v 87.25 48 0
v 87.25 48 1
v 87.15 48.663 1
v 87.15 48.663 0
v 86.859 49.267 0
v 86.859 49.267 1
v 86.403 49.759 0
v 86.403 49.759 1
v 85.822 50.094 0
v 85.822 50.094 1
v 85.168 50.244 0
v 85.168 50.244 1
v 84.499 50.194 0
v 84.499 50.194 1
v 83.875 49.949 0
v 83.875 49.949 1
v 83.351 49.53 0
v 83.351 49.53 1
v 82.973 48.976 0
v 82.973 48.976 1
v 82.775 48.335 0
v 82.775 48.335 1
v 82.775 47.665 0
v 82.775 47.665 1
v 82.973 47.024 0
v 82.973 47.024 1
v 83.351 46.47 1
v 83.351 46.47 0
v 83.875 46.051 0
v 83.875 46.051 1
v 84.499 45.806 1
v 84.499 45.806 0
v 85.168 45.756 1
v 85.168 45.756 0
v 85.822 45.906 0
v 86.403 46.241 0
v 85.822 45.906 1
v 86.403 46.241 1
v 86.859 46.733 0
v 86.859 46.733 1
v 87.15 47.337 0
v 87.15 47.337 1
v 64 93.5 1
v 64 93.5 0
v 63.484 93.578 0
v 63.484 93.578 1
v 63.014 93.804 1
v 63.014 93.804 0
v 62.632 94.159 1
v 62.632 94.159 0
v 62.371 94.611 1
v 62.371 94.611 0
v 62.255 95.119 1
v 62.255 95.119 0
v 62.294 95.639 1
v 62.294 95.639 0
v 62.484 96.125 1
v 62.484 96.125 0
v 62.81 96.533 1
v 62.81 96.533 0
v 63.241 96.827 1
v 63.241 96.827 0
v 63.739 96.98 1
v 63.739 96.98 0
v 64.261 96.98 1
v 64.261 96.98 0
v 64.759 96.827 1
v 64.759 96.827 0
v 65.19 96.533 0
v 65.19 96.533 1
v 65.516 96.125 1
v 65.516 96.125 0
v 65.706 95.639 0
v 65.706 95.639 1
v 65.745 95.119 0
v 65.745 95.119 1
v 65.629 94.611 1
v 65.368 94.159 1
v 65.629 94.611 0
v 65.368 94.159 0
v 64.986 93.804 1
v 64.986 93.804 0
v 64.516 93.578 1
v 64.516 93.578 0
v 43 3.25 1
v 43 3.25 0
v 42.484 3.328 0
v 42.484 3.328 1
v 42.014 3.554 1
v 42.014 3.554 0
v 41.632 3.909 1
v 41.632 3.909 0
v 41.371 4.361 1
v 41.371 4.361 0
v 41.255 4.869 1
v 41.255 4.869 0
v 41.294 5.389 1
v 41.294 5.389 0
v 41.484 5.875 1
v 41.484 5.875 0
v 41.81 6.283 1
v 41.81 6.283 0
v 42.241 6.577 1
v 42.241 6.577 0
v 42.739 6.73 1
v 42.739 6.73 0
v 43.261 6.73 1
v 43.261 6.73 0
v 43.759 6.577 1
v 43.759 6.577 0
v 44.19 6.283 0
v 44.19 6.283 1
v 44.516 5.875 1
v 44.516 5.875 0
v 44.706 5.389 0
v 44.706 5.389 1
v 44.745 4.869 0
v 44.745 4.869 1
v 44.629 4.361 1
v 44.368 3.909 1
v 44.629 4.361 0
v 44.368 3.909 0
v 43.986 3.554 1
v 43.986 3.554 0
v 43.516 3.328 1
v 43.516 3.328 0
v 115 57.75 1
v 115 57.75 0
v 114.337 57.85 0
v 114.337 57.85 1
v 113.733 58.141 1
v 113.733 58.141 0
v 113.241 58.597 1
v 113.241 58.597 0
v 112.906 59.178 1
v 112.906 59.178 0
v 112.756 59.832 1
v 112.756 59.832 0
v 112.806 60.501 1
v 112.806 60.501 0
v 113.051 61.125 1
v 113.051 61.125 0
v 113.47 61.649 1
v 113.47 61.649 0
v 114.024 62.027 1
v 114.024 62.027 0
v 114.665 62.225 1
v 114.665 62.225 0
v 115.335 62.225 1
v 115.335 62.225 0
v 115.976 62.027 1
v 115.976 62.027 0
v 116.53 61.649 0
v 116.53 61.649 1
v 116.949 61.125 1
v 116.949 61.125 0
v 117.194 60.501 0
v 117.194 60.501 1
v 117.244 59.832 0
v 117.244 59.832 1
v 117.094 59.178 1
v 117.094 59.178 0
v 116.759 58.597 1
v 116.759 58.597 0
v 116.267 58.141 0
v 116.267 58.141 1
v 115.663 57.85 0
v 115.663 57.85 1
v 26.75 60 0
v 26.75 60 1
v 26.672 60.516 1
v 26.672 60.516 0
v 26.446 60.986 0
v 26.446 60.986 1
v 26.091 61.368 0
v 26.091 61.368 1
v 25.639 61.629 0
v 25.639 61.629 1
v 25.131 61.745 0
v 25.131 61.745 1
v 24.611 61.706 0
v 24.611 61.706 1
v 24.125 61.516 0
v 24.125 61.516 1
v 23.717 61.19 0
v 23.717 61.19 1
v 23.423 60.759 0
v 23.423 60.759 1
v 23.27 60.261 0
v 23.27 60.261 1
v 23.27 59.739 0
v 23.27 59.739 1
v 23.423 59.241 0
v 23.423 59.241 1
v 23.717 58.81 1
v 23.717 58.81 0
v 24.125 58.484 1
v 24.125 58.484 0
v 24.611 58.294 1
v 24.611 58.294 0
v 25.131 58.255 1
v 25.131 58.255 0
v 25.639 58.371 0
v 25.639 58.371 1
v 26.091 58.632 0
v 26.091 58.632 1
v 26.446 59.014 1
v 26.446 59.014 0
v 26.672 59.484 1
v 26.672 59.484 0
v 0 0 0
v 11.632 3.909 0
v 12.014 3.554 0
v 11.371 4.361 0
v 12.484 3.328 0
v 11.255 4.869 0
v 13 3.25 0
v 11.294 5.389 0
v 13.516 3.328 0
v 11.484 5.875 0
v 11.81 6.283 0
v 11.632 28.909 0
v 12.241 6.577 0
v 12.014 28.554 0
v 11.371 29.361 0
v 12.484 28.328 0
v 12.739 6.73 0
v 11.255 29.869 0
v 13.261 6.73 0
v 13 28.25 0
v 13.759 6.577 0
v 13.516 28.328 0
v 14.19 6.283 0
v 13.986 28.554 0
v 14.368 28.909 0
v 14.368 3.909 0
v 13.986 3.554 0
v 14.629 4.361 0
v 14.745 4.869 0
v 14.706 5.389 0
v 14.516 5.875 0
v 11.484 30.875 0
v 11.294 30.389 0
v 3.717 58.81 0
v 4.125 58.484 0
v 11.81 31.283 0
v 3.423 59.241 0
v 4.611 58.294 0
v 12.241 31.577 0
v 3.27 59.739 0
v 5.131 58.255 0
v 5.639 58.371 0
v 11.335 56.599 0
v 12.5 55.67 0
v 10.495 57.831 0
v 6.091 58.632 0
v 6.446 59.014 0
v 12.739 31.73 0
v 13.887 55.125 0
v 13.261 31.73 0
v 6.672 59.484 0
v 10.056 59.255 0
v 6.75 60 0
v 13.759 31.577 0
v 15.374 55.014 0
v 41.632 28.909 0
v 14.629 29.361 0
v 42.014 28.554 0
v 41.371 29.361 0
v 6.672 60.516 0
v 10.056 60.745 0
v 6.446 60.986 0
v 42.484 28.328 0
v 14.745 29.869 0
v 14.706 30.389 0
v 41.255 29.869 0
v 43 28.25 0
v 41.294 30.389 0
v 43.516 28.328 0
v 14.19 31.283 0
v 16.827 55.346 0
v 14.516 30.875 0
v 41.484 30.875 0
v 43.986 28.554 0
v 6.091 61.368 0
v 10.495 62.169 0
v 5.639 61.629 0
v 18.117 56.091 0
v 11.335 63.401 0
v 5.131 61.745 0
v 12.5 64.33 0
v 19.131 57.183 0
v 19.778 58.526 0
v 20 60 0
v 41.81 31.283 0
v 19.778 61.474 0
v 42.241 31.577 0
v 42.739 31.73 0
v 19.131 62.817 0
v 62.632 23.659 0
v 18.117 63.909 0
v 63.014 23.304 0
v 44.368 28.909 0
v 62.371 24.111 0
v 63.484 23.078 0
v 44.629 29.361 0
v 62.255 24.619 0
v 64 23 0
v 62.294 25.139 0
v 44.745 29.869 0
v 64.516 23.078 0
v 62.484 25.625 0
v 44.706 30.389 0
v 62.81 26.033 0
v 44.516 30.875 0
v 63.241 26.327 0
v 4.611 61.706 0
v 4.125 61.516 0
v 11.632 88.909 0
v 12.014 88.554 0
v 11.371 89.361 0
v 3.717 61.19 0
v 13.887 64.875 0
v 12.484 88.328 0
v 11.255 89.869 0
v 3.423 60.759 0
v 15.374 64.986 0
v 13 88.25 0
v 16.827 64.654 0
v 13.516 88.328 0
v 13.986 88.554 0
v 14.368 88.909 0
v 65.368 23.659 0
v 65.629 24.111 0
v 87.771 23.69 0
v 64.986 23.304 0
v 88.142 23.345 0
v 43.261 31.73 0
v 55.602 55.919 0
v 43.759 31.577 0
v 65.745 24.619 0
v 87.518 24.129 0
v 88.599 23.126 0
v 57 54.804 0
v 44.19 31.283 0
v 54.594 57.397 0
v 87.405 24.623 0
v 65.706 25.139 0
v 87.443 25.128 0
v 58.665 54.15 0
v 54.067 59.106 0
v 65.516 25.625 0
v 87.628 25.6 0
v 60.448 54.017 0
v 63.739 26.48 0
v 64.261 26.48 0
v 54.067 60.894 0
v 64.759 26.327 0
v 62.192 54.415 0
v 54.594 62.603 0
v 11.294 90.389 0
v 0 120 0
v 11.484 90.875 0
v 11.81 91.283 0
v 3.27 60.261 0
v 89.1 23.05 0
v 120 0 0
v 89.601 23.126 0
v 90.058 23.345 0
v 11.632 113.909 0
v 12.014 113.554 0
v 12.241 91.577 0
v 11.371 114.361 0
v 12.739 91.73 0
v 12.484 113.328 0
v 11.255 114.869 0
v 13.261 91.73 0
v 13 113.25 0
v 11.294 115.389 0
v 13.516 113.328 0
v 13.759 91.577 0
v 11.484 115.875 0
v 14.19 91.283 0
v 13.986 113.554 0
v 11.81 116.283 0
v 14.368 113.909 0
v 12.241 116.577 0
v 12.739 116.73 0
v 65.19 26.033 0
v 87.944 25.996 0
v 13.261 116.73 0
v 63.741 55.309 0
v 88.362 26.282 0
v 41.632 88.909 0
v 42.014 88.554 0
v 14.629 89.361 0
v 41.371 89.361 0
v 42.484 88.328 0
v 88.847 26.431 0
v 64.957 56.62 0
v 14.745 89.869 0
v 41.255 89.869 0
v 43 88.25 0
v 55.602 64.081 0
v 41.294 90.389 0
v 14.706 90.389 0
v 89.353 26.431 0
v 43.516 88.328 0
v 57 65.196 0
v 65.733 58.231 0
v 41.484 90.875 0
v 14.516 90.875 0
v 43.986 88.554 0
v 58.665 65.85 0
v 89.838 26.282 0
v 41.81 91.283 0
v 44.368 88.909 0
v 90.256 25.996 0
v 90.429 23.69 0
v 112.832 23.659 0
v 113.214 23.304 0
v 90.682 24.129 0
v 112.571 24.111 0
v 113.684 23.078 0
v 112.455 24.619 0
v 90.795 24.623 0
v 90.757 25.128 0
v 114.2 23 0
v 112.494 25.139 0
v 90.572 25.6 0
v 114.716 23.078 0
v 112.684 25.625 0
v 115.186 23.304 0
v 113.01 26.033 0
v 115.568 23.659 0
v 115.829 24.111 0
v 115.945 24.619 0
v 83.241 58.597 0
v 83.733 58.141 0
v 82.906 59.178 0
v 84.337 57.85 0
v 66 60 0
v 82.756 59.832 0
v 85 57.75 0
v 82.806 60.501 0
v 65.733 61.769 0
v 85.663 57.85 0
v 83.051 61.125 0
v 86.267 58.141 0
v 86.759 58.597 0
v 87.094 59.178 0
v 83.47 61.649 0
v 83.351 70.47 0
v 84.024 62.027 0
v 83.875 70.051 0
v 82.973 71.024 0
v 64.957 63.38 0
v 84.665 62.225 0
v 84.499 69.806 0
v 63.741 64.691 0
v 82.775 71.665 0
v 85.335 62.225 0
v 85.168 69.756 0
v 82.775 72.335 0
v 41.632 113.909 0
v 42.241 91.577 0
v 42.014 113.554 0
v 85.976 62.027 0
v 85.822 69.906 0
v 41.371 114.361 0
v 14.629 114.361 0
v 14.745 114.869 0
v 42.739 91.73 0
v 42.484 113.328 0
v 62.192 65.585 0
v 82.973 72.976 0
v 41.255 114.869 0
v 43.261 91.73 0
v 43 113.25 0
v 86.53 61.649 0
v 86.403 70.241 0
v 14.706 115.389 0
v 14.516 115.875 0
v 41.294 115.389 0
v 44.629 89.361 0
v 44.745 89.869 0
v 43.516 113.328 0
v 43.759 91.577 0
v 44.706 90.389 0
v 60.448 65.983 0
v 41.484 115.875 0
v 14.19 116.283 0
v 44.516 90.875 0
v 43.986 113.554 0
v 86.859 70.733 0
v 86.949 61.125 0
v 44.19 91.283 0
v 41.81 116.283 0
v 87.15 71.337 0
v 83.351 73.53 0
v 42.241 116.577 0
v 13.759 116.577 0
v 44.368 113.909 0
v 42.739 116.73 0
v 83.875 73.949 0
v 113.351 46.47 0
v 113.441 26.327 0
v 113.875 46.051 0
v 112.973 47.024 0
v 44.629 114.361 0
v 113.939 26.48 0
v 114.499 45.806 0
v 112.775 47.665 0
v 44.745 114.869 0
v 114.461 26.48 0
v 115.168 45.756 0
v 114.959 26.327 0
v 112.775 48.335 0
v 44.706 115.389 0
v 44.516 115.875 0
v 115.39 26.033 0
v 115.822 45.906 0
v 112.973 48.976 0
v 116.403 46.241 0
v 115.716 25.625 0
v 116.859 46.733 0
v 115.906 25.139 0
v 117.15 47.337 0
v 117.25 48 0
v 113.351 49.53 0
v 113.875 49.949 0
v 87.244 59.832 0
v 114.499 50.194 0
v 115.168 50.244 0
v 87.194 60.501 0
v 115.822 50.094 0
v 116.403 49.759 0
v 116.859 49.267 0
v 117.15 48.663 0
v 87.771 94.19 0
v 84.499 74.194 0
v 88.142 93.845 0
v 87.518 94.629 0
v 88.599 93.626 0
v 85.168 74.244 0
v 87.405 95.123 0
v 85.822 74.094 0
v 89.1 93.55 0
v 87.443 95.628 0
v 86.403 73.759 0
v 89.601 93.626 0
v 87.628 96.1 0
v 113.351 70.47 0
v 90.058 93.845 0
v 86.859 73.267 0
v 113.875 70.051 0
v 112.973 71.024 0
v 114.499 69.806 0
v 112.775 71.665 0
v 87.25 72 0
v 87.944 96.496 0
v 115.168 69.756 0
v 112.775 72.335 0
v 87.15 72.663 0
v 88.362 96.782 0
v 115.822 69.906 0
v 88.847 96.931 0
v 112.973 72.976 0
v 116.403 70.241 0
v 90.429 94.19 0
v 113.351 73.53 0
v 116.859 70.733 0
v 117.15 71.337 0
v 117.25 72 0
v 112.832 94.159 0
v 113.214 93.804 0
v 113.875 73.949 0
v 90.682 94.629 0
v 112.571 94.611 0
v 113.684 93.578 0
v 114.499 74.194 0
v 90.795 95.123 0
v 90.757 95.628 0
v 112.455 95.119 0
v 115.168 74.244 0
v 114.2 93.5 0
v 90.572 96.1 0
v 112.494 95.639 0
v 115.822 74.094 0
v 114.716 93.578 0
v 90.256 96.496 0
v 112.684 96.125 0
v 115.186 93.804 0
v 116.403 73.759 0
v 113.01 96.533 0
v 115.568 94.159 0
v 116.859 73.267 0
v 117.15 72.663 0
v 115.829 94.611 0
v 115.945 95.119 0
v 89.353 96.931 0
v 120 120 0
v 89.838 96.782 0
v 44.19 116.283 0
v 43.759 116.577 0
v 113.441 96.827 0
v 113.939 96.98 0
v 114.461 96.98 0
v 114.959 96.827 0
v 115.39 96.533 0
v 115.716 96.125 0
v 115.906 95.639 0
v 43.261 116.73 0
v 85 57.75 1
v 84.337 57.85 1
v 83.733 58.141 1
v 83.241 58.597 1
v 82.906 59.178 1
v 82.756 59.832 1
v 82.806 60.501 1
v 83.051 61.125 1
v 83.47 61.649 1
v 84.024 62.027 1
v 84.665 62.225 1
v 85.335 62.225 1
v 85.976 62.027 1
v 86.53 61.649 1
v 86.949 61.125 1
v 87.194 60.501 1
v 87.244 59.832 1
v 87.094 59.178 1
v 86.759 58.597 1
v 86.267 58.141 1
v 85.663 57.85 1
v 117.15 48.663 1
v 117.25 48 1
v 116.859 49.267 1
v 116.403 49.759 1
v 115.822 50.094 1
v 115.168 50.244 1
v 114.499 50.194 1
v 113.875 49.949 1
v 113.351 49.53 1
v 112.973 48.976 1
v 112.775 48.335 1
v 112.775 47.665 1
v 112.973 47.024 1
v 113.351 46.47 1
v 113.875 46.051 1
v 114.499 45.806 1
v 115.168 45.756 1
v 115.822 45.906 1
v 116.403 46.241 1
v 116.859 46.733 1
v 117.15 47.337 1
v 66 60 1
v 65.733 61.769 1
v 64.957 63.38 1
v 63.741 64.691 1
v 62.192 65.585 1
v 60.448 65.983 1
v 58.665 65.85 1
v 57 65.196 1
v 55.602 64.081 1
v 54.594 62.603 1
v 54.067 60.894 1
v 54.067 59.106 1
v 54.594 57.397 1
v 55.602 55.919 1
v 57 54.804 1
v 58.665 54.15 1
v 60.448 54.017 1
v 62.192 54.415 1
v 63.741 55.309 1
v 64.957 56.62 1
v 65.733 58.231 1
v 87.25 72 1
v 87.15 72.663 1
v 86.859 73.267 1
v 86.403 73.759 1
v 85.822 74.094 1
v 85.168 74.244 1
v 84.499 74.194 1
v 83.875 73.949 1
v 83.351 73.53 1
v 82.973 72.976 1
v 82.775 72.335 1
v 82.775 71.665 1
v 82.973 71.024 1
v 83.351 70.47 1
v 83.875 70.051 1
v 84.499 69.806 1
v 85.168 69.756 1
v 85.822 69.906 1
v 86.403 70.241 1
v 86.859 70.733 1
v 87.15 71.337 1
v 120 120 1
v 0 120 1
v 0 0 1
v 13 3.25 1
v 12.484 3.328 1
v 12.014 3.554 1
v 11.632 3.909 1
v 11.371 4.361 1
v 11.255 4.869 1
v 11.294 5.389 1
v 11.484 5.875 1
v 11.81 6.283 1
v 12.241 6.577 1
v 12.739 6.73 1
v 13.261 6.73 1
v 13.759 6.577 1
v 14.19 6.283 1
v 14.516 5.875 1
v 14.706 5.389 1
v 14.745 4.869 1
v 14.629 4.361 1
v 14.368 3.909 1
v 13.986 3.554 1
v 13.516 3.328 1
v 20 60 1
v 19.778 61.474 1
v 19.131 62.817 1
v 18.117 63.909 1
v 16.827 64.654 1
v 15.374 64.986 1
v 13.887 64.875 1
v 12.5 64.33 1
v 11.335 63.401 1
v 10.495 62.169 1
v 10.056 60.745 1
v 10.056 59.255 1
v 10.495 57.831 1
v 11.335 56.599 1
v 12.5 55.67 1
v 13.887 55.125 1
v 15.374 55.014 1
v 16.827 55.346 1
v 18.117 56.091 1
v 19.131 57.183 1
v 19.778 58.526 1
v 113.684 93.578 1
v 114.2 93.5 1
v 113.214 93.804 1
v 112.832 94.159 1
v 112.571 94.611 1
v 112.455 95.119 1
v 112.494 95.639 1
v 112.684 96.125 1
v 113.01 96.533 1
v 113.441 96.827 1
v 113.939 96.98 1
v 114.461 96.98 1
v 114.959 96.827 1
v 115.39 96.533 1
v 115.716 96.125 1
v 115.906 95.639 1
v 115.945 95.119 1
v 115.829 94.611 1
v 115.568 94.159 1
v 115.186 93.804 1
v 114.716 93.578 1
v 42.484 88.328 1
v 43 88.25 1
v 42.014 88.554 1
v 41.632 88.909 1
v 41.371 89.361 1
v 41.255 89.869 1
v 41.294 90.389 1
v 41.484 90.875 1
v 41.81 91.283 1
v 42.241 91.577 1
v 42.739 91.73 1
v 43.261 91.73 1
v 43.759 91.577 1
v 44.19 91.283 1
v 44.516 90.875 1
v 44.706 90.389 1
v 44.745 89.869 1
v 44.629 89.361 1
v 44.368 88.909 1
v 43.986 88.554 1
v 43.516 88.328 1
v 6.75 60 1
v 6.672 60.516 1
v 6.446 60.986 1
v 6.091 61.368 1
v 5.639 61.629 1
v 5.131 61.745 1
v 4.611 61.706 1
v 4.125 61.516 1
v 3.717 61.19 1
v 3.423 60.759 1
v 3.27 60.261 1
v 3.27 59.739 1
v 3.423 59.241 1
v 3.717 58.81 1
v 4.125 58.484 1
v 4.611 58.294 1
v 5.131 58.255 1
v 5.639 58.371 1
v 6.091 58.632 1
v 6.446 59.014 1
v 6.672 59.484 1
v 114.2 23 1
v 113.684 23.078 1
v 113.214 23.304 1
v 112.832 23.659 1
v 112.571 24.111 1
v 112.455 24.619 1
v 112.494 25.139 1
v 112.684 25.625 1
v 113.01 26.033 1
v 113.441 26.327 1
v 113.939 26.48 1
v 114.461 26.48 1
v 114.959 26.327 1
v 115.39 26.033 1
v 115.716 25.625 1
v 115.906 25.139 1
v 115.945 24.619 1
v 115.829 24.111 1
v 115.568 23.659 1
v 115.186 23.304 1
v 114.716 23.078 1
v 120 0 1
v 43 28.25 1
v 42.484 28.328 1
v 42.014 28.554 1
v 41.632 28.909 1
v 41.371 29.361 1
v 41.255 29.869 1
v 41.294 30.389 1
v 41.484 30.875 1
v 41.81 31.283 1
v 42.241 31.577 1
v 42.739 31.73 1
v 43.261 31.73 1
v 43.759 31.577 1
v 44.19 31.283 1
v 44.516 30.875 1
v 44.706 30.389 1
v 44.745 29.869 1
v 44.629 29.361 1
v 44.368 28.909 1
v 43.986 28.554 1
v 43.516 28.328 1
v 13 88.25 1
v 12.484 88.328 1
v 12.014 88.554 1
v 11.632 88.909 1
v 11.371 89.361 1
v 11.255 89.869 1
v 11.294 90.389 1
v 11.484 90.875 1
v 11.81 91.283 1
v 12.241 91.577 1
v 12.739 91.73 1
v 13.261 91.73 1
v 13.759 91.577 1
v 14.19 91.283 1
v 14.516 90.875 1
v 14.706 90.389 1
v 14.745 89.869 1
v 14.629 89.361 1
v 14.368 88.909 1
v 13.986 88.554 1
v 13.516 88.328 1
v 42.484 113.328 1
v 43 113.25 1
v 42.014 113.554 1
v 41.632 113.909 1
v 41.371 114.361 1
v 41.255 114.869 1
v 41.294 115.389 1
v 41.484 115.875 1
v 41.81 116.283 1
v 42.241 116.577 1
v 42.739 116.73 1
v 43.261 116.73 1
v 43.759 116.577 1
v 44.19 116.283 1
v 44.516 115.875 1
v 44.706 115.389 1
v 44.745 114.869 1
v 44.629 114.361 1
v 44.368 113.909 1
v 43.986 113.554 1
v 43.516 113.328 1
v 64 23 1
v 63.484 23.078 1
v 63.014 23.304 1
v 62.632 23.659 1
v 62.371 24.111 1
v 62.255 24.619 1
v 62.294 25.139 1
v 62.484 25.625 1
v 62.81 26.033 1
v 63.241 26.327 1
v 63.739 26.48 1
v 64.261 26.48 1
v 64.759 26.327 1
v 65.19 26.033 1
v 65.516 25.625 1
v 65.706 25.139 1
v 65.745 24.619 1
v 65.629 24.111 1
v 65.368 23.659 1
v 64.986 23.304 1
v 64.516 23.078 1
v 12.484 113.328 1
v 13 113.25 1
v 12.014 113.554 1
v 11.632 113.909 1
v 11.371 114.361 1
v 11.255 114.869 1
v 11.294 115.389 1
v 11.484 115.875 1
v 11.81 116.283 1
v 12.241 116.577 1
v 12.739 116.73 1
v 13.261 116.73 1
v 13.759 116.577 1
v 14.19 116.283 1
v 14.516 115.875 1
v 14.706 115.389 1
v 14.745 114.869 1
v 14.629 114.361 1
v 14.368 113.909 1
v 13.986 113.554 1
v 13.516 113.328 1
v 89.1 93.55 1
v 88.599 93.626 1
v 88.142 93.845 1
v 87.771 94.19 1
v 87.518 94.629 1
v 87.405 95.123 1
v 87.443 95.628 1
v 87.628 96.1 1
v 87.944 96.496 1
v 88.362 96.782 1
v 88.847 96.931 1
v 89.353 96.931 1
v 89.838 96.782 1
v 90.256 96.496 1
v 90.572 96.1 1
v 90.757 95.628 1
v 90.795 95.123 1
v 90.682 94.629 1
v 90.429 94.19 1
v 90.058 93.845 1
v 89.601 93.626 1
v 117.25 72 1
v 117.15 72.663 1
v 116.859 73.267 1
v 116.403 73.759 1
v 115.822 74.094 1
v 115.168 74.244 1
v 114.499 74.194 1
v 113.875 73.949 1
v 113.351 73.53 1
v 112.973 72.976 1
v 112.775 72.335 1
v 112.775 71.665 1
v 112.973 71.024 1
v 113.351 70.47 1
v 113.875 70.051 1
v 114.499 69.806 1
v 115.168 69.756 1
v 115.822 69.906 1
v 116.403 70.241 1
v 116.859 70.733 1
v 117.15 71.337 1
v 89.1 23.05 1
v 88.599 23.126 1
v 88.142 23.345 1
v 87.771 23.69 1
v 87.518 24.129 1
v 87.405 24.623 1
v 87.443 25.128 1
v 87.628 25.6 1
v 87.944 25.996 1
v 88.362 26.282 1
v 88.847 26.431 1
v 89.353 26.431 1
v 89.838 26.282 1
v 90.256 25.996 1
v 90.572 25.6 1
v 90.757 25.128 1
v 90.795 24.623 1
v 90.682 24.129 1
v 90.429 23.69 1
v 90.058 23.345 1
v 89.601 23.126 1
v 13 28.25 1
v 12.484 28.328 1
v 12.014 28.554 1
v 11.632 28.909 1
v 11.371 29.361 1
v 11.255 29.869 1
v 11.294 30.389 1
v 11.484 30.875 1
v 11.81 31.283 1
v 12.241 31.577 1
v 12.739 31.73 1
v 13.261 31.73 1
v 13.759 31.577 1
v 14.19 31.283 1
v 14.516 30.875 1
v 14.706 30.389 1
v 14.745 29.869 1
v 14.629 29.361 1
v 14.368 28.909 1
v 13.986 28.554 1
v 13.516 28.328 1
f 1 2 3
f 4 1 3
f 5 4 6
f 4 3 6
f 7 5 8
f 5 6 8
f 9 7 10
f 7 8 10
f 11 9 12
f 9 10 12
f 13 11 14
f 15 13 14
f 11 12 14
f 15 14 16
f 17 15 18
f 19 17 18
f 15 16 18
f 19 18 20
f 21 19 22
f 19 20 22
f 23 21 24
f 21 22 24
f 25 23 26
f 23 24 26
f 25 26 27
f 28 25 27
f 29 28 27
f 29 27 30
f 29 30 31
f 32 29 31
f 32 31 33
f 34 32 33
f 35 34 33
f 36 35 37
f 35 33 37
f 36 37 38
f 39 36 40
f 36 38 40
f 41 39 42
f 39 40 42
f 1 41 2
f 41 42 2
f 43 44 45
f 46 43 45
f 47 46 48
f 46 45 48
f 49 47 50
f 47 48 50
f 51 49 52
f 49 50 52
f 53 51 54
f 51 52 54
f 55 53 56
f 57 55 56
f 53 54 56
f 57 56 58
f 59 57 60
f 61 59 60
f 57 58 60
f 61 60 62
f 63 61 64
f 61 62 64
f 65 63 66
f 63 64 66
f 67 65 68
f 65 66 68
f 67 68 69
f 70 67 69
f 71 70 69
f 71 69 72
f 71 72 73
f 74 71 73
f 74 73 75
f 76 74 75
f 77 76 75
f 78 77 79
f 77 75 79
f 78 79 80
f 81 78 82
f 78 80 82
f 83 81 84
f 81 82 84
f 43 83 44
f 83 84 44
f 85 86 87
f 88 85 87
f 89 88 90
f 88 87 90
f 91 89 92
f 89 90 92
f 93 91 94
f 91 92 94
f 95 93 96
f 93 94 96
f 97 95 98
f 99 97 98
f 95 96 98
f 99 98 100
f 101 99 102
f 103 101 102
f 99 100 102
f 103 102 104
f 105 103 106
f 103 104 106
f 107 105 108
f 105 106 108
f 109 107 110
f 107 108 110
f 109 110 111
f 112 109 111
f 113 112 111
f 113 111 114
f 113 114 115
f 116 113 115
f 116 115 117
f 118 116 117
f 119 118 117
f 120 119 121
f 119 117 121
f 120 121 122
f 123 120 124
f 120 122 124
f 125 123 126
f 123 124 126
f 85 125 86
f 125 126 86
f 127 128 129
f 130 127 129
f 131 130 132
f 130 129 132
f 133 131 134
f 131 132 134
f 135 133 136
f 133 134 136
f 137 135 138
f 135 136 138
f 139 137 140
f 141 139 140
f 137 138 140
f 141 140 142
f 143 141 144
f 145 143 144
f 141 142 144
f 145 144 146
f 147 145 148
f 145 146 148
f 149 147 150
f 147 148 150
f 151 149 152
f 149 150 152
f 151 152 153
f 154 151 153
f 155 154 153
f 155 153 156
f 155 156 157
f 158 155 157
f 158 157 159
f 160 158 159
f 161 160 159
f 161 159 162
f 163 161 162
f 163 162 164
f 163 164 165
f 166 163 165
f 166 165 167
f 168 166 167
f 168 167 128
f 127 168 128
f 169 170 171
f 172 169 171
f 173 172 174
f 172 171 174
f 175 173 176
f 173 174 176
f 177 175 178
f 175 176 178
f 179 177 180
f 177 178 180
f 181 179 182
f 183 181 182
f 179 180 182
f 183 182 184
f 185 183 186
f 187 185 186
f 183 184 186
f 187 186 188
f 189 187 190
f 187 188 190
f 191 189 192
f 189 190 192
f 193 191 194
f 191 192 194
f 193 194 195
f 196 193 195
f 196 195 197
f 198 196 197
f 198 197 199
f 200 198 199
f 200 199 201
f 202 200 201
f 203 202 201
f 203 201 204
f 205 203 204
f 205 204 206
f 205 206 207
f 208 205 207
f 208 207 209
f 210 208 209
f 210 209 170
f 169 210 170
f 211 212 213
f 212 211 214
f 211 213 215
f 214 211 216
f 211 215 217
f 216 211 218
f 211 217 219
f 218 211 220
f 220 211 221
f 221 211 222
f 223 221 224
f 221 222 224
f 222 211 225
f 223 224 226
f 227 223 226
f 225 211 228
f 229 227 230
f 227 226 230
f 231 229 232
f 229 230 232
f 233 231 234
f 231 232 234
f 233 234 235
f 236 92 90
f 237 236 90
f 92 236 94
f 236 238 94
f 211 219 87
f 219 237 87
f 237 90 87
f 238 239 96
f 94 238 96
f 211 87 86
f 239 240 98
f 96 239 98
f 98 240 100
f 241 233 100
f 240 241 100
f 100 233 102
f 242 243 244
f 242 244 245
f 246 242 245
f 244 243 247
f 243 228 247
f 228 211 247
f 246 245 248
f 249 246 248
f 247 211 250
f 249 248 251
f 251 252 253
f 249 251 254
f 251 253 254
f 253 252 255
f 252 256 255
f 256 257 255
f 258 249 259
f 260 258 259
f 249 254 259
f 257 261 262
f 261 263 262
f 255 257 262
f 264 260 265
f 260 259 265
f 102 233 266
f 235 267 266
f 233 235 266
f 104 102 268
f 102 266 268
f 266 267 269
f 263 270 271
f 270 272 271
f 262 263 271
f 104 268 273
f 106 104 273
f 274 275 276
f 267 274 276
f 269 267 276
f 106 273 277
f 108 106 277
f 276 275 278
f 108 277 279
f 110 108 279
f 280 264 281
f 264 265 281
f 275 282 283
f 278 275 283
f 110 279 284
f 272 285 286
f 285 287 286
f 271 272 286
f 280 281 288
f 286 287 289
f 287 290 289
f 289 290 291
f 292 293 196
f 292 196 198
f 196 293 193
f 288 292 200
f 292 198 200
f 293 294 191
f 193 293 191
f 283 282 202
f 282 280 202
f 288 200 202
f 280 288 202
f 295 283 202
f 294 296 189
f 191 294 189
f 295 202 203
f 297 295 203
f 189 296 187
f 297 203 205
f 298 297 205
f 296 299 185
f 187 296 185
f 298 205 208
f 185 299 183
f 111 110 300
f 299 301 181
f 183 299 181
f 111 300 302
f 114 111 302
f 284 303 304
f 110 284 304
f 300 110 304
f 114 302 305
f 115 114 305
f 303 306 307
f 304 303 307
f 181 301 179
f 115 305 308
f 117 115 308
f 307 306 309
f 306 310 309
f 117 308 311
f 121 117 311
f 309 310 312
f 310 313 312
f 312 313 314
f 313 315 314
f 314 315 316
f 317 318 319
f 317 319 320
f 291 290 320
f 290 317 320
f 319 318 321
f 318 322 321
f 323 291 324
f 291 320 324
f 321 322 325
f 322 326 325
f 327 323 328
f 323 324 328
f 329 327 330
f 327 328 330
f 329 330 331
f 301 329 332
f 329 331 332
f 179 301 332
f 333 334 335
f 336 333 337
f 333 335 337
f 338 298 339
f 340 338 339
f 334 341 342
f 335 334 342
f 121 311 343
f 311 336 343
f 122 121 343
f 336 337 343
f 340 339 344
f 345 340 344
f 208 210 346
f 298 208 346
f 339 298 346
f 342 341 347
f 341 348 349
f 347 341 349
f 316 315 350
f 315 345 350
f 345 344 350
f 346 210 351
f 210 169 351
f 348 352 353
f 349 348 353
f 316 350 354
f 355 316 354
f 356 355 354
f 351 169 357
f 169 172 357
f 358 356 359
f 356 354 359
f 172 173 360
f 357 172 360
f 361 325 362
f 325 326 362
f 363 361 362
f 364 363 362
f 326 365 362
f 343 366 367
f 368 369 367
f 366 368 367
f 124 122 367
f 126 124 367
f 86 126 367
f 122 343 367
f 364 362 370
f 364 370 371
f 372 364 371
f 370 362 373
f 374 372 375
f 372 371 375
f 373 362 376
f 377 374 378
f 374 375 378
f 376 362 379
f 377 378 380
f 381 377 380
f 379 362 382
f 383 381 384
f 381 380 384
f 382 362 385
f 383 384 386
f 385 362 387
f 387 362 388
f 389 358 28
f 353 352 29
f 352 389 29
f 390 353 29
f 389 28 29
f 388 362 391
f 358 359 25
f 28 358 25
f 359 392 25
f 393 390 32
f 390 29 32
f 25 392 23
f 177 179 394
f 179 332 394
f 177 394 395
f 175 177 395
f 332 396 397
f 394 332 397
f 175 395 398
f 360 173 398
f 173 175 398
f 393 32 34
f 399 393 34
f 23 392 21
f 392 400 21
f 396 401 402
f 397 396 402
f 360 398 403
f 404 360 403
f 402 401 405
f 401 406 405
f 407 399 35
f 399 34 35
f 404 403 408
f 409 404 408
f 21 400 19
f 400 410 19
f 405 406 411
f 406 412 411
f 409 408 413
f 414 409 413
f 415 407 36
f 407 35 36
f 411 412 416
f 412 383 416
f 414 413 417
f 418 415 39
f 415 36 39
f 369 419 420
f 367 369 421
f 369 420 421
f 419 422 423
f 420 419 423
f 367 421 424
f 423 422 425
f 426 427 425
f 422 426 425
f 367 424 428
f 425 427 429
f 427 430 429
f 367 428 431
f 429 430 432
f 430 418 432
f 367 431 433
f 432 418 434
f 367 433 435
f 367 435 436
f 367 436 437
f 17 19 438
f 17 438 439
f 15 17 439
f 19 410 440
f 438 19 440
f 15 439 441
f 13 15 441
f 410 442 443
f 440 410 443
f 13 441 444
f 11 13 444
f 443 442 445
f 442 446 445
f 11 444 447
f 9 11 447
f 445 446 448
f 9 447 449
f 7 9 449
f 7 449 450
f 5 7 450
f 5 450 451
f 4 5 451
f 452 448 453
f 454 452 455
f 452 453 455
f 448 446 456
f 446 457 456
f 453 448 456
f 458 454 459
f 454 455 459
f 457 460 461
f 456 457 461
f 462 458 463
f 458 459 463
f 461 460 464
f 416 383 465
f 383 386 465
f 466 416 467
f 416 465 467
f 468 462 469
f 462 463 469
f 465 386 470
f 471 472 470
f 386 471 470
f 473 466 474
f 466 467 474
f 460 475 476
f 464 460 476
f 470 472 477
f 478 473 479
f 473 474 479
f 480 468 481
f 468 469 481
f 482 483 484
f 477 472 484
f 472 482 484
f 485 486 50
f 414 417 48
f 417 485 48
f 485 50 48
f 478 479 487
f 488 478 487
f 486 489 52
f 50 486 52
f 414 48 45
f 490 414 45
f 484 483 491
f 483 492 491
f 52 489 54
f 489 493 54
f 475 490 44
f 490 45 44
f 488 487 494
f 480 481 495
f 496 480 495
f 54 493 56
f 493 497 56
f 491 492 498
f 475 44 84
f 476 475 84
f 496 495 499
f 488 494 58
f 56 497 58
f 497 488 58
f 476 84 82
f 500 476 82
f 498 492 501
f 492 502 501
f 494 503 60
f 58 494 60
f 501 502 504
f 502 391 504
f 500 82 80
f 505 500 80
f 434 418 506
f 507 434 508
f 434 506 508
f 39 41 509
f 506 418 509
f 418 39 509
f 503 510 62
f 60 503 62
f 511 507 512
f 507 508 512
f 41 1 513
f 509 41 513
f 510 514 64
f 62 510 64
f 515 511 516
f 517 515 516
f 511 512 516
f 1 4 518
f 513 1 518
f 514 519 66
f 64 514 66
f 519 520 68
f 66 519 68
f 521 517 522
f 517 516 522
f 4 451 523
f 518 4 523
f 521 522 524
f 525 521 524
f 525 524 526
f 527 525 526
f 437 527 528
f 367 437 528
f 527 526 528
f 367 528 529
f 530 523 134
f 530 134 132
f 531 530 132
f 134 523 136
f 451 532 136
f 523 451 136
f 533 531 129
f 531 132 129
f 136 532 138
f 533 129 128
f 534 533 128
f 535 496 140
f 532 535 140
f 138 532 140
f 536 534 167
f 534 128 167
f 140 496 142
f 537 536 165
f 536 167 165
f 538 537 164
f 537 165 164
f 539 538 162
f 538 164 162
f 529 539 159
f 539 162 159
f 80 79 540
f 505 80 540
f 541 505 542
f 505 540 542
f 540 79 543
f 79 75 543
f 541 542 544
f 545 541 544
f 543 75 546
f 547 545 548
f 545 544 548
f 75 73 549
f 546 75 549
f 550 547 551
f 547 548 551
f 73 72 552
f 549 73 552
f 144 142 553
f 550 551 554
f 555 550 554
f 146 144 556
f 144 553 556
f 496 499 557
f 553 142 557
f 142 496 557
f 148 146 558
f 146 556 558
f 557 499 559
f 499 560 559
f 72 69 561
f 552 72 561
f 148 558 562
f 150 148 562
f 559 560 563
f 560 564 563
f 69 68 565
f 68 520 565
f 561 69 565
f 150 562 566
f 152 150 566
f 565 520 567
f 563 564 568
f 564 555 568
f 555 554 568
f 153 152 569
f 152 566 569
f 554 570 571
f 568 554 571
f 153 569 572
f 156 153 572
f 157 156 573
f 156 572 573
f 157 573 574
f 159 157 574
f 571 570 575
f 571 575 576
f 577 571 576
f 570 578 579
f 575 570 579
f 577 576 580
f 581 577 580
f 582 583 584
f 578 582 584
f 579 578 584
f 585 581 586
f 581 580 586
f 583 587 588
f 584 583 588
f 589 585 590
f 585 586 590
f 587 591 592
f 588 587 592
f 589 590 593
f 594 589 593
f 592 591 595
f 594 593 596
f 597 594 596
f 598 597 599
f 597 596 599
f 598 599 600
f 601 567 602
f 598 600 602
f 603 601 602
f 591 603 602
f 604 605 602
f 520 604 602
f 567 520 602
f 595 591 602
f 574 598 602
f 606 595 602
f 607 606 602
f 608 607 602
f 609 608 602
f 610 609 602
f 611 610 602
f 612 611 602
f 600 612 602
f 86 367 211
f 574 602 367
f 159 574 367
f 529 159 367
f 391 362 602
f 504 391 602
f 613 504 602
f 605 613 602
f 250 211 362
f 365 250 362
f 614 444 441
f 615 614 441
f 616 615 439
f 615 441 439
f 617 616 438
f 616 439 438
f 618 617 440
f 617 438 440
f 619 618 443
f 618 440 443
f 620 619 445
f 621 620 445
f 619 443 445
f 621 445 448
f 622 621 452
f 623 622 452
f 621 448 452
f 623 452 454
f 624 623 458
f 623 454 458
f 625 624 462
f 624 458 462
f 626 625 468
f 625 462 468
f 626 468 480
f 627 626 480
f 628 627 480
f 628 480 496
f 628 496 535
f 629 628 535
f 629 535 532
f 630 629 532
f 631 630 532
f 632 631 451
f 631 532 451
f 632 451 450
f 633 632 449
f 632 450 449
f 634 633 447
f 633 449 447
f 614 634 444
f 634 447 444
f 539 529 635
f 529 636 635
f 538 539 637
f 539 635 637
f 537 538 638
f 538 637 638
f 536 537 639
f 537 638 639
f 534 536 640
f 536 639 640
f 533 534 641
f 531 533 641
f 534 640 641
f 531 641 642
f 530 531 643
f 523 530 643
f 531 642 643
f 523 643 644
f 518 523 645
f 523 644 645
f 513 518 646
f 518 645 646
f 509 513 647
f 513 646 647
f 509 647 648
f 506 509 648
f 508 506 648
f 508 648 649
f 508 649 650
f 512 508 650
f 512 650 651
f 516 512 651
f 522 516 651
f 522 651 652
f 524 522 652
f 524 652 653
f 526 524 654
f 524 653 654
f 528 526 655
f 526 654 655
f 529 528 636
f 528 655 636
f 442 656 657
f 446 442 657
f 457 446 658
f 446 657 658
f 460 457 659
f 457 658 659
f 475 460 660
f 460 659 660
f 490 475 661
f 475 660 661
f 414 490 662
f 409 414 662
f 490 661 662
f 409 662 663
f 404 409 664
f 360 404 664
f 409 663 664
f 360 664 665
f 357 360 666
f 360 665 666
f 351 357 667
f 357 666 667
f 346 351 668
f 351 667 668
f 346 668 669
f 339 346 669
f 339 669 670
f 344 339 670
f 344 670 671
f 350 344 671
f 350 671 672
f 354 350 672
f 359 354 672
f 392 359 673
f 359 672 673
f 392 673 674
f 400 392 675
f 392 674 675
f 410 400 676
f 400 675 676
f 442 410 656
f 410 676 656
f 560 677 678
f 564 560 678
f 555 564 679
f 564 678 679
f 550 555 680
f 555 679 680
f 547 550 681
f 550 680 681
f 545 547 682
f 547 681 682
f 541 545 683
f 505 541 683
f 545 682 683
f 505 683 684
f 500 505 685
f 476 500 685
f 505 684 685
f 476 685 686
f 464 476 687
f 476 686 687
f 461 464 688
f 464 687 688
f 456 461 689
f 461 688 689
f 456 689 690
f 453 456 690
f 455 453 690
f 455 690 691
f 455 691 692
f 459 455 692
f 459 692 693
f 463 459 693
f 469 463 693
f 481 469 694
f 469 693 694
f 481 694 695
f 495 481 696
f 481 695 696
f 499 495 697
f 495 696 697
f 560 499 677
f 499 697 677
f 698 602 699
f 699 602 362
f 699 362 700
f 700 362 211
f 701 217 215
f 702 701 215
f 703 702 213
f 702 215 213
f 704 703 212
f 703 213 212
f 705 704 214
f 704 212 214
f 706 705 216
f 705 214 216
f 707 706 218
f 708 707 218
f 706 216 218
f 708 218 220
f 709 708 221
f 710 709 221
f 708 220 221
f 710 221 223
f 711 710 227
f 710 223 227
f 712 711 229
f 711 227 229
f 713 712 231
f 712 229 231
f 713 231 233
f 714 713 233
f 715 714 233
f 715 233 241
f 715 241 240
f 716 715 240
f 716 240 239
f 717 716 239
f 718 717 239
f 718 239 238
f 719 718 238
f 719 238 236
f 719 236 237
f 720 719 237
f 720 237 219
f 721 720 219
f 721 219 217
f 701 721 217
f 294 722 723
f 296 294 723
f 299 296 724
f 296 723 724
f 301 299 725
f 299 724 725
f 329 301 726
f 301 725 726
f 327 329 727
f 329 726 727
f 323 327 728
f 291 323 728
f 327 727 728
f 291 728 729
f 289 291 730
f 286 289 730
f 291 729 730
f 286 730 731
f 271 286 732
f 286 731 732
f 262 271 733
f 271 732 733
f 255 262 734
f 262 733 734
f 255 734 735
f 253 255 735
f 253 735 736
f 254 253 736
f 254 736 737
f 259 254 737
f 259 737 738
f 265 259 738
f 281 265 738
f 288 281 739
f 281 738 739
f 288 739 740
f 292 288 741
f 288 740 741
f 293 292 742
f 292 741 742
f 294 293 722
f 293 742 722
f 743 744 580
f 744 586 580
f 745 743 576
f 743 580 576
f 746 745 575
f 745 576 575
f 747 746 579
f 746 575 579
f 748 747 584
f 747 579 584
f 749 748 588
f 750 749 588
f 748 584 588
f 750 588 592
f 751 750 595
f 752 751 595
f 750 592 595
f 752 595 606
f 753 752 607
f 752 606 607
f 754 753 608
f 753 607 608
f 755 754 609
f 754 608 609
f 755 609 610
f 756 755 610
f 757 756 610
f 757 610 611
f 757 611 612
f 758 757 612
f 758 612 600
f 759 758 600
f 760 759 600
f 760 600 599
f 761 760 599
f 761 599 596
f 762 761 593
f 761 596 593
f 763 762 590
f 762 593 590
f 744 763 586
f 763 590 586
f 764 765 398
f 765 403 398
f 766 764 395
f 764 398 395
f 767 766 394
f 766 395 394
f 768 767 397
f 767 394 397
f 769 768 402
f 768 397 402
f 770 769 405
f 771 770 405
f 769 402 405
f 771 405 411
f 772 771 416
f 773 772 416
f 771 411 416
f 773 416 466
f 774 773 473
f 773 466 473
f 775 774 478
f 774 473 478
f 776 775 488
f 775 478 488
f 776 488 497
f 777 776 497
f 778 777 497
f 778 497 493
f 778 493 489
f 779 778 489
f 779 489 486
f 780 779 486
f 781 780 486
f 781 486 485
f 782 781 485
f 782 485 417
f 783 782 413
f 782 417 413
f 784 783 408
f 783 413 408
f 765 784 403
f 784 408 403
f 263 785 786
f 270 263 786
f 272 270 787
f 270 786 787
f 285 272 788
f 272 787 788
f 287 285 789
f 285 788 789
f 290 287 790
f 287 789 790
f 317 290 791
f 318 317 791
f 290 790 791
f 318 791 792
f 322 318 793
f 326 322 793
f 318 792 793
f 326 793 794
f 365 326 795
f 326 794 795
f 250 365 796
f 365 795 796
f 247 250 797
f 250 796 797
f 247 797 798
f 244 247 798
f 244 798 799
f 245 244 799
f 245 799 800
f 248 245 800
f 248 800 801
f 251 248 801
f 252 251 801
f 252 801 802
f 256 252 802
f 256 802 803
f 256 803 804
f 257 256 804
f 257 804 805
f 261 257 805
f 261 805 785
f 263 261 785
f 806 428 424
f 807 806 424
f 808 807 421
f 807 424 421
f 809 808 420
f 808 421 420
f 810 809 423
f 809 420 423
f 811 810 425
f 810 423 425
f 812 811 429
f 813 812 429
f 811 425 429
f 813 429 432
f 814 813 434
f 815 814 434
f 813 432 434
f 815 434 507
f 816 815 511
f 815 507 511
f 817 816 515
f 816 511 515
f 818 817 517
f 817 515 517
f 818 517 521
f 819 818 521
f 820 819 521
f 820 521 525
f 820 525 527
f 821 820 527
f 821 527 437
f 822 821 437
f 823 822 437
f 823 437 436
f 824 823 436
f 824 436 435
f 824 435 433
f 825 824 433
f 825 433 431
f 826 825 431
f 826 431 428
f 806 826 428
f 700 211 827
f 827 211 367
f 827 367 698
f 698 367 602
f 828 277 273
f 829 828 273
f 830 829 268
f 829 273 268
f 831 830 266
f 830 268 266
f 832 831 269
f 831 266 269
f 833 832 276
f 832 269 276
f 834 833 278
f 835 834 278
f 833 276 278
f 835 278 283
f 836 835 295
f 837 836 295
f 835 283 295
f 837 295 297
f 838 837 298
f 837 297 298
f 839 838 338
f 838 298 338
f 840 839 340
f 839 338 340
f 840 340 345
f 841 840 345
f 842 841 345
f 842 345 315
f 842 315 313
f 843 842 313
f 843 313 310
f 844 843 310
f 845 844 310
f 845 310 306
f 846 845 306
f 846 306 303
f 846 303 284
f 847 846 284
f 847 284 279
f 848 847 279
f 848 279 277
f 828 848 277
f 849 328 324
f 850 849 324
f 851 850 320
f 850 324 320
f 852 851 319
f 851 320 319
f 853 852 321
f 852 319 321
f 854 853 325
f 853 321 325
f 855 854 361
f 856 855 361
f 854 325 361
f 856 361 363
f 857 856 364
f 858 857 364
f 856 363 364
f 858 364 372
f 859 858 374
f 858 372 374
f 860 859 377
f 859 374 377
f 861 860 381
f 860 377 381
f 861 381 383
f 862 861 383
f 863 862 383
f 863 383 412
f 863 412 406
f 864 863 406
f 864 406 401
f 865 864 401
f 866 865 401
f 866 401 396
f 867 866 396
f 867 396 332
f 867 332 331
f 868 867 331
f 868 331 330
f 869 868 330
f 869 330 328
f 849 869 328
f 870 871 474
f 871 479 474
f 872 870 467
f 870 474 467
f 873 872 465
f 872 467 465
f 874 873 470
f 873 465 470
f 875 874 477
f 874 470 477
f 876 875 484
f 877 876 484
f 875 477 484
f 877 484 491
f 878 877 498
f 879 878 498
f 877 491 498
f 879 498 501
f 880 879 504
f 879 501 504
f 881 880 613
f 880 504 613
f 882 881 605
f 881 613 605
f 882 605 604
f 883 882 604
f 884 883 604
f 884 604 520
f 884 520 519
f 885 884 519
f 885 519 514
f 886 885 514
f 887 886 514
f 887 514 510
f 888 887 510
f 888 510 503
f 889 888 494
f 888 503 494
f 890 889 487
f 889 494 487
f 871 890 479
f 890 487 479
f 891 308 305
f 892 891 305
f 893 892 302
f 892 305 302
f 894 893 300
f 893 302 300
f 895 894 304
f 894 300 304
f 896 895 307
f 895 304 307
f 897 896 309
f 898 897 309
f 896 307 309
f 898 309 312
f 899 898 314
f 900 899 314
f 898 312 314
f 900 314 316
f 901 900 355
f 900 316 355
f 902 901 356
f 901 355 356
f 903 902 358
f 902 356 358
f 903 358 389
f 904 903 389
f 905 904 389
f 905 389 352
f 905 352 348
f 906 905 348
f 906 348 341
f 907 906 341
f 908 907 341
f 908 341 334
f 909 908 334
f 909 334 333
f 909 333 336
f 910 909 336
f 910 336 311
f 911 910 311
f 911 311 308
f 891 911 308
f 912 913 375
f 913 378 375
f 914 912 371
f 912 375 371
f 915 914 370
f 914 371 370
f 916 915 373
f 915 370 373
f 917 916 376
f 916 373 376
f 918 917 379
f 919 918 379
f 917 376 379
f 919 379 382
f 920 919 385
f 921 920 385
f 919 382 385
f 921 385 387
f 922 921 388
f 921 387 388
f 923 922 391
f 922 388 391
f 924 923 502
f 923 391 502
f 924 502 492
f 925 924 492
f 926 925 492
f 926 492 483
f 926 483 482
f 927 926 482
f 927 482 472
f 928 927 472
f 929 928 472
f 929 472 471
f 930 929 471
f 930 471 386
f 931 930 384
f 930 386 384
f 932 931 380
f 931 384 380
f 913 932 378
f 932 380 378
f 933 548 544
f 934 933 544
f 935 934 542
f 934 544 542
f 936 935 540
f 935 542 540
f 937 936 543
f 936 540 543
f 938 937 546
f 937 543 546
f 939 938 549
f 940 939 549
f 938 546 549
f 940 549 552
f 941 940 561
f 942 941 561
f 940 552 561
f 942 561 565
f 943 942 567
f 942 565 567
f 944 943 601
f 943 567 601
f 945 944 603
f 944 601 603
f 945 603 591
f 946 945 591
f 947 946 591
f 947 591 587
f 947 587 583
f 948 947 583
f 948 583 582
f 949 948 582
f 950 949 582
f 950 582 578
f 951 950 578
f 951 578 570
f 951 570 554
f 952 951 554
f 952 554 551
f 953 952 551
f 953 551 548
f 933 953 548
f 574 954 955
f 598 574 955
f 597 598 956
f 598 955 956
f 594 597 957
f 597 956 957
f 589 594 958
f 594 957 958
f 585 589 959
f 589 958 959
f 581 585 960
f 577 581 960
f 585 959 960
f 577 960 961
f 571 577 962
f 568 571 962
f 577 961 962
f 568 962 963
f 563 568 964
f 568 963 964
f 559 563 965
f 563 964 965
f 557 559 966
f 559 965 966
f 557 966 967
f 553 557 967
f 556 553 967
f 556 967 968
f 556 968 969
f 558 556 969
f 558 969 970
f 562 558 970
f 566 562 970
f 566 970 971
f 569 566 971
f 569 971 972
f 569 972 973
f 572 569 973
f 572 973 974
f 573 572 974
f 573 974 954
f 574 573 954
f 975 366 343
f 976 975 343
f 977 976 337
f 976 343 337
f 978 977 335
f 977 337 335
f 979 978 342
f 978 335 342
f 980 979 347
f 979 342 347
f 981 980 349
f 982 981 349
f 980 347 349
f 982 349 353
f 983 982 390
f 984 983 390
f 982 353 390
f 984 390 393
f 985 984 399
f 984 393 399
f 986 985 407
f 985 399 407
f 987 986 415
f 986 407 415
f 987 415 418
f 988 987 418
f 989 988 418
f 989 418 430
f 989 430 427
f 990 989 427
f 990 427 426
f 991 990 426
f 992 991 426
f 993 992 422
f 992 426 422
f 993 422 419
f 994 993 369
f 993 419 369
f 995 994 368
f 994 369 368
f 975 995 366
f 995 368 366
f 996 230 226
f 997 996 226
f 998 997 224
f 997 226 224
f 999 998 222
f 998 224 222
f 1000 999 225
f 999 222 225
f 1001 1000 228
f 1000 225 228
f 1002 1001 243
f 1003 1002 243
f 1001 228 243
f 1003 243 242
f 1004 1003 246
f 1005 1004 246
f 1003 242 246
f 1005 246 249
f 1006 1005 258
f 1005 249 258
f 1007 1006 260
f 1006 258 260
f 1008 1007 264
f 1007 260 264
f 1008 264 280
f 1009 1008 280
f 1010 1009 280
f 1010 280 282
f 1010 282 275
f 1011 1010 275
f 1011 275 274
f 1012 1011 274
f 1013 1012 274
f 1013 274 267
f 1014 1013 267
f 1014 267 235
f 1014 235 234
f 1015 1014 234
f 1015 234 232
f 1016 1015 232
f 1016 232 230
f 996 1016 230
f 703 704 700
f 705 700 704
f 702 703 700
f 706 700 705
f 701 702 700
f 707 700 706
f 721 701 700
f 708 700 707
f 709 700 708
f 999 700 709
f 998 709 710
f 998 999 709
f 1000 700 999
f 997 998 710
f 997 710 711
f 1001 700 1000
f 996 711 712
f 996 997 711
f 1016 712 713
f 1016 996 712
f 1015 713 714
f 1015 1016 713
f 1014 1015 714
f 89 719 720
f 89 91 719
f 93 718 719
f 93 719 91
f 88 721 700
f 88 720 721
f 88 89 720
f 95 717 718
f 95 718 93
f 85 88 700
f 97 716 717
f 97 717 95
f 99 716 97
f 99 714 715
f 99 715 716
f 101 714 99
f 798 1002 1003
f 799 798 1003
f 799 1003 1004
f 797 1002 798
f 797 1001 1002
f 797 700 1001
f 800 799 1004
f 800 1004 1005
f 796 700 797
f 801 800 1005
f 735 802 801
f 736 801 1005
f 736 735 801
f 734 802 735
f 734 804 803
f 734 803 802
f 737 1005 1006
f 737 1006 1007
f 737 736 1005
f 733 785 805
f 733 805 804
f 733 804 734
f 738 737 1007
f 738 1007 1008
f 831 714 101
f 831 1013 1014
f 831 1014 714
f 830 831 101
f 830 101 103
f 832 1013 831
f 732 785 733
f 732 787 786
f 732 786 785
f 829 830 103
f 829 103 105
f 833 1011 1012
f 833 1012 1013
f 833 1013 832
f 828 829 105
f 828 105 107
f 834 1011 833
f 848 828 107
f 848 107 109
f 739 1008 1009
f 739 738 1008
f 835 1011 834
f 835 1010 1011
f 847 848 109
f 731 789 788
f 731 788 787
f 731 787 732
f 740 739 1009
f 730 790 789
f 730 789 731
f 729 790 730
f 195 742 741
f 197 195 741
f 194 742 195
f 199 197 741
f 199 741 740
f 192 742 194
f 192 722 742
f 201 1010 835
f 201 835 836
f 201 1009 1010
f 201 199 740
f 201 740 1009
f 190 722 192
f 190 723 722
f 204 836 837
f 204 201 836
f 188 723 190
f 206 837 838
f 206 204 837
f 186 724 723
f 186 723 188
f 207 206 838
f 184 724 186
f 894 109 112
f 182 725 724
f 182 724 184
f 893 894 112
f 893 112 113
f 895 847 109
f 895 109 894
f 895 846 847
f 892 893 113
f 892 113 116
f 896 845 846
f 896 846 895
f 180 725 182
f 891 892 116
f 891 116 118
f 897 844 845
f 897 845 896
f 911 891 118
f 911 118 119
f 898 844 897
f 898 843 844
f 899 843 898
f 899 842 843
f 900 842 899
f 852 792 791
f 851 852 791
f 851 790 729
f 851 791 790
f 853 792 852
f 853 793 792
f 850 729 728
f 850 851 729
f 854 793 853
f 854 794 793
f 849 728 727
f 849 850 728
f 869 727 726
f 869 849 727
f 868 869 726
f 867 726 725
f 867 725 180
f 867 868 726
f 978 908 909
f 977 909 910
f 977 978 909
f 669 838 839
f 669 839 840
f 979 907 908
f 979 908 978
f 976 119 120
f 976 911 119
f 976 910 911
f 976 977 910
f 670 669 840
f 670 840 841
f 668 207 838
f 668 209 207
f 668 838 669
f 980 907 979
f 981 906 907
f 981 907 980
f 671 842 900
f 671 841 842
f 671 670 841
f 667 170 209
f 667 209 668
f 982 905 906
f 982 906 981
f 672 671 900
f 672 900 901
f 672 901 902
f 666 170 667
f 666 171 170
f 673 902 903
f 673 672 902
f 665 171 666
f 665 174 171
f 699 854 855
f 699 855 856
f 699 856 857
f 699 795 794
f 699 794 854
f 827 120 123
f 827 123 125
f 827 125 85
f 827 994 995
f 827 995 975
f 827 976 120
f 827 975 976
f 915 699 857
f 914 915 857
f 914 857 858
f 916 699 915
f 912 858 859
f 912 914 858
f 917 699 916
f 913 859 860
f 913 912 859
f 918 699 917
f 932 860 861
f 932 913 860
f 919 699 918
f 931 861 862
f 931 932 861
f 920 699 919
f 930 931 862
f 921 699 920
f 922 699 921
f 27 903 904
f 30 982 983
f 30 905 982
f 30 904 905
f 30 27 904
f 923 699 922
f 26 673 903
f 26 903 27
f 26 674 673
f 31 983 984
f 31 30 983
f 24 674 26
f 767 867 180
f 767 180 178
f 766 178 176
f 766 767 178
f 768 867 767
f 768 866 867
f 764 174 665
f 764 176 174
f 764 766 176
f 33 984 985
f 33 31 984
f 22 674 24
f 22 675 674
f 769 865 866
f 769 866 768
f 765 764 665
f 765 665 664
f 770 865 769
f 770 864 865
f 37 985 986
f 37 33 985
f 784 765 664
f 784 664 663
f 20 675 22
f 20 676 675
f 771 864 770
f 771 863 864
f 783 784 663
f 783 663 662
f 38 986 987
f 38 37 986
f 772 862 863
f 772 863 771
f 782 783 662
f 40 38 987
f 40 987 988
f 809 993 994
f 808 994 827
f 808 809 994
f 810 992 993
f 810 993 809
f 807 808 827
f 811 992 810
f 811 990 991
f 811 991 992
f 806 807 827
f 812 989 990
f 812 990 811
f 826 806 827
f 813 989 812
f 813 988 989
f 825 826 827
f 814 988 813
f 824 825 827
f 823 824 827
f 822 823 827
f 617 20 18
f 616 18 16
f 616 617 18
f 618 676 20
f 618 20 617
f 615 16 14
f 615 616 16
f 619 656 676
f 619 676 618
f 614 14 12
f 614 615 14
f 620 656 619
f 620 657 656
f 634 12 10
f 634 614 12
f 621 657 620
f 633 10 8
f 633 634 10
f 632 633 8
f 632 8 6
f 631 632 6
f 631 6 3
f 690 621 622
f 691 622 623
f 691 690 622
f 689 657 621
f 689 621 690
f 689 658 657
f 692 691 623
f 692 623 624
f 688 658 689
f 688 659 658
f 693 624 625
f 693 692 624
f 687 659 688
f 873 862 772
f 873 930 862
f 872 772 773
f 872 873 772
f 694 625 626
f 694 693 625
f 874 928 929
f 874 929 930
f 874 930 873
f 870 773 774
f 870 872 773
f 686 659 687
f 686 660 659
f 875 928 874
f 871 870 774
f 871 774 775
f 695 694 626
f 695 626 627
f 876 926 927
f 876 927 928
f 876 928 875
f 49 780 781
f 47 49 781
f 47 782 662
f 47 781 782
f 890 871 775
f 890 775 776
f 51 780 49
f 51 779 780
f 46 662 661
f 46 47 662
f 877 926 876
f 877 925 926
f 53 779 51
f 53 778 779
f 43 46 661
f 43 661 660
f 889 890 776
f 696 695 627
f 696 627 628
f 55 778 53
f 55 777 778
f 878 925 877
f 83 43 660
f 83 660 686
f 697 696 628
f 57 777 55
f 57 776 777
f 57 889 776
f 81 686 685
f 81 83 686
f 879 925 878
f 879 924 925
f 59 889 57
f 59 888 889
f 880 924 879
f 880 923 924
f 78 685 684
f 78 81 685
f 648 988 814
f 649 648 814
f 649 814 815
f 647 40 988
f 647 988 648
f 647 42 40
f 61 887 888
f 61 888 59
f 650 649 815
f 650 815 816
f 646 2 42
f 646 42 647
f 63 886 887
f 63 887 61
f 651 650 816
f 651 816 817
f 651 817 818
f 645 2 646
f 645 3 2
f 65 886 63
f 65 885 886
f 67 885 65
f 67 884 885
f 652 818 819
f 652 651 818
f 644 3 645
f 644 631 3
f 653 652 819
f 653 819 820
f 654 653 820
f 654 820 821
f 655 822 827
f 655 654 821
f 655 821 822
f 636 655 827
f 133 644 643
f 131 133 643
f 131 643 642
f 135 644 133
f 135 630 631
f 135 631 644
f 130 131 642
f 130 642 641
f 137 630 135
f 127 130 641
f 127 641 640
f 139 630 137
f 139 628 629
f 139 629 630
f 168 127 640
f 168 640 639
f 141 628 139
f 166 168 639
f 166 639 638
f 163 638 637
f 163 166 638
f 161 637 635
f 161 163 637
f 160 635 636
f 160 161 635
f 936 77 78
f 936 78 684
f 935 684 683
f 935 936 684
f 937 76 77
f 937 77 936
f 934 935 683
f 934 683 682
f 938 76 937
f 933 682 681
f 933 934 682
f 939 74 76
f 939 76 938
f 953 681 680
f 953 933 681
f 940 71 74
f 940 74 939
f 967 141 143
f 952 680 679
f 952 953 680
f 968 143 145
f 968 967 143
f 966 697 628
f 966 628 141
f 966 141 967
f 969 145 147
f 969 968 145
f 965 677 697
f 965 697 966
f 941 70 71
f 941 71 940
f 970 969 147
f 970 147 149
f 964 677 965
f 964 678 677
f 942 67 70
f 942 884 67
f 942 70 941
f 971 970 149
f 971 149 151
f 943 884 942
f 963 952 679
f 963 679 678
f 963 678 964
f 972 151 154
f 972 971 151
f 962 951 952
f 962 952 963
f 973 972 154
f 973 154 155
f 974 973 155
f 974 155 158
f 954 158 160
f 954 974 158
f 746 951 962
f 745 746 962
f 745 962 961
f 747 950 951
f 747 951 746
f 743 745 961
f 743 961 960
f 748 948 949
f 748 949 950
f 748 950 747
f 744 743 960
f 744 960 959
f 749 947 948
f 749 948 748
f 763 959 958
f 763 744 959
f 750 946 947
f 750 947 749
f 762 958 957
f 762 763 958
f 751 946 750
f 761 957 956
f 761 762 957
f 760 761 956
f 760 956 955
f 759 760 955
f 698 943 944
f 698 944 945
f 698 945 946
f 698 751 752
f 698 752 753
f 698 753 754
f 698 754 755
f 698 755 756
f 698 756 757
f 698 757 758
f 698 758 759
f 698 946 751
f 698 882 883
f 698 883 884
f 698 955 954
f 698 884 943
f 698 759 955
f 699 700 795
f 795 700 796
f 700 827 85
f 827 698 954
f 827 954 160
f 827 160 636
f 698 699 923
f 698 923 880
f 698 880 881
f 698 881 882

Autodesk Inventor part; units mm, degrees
ref_plane "YZ Plane" through (0, 0, 0) normal (1, 0, 0) x (0, 1, 0)
ref_plane "XZ Plane" through (0, 0, 0) normal (0, 1, 0) x (-1, 0, 0)
sketch "スケッチ1" plane through (0, 0, 0) normal (0, 0, 1) x (1, 0, 0)
  line L0 (0, 0) -> (120, 0)
  line L1 (120, 0) -> (120, 120)
  line L2 (120, 120) -> (0, 120)
  line L3 (0, 120) -> (0, 0)
  dimension "d0" = 120
  dimension "d1" = 120
extrude "押し出し1" add sketch "スケッチ1" along normal blind 1
sketch "スケッチ2" plane through (0, 0, 1) normal (0, 0, 1) x (1, 0, 0)
  line L0 (0, 120) -> (0, 0) projected
  line L1 (0, 60) -> (120, 60)
  line L2 (120, 0) -> (120, 120) projected
  circle A0 centre (60, 60) radius 6
  circle A1 centre (15, 60) radius 5
  circle A2 centre (115, 95.25) radius 1.5
  circle A3 centre (85, 95.25) radius 1.5
  line L3 (120, 120) -> (0, 120) projected
  circle A4 centre (5, 60) radius 1.75
  circle A5 centre (25, 60) radius 1.75
  dimension "d4" = 12
  dimension "d5" = 10
  dimension "d6" = 3
  dimension "d7" = 3
  dimension "d8" = 15
  dimension "d9" = 30
  dimension "d10" = 5
  dimension "d11" = 24.75
  dimension "d12" = 24.75
  dimension "d13" = 3.5
  dimension "d14" = 3.5
  dimension "d15" = 20
  dimension "d16" = 5
extrude "押し出し2" cut sketch "スケッチ2" against normal through all contours A4 L1 | L1 A4 | A0 L1 | L1 A0 | A1 L1 | L1 A1 | A5 L1 | L1 A5 | A2 | A3
sketch "スケッチ3" plane through (0, 0, 1) normal (0, 0, 1) x (1, 0, 0)
  line L0 (0, 120) -> (0, 0) projected
  line L1 (0, 60) -> (120, 60) construction
  line L2 (120, 0) -> (120, 120) projected
  line L3 (120, 120) -> (0, 120) construction
  point P0 (13, 115)
  point P1 (43, 115)
  point P2 (13, 90)
  point P3 (43, 90)
  point P4 (13, 5)
  point P5 (43, 5)
  point P6 (13, 30)
  point P7 (43, 30)
  dimension "d19" = 5
  dimension "d20" = 13
  dimension "d23" = 30
  dimension "d26" = 25
hole "穴1" at (13, 115, 1) at (43, 115, 1) at (13, 90, 1) at (43, 90, 1) at (13, 5, 1) at (43, 5, 1) at (43, 30, 1) at (13, 30, 1) direction (0, 0, -1) diameter 3.5 end through all
sketch "スケッチ4" plane through (0, 0, 1) normal (0, 0, 1) x (1, 0, 0)
  point P0 (0, 0)
sketch "スケッチ5" plane through (0, 0, 1) normal (0, 0, 1) x (1, 0, 0)
  circle A0 centre (85, 95.25) radius 1.5 projected
  circle A1 centre (85, 95.25) radius 1.5
  circle A2 centre (115, 95.25) radius 1.5 projected
  circle A3 centre (115, 95.25) radius 1.5
  point P0 (0, 0)
extrude "押し出し3" add sketch "スケッチ5" against normal blind 1
sketch "スケッチ6" plane through (0, 0, 1) normal (0, 0, 1) x (1, 0, 0)
  line L0 (0, 120) -> (0, 0) projected
  line L1 (0, 60) -> (120, 60) construction
  line L2 (120, 0) -> (120, 120) projected
  line L3 (0, 0) -> (120, 0) projected
  line L4 (50.2, 60) -> (170.2, 60) construction
  line L5 (120, 120) -> (0, 120) projected
  point P0 (64, 24.75)
  point P1 (114.2, 24.75)
  point P2 (85, 48)
  point P3 (115, 48)
  point P4 (64, 95.25)
  point P5 (114.2, 95.25)
  point P6 (85, 72)
  point P7 (115, 72)
  dimension "d38" = 64
  dimension "d39" = 24.75
  dimension "d42" = 50.2
  dimension "d47" = 72
  dimension "d48" = 85
  dimension "d51" = 30
hole "穴2" at (64, 24.75, 1) at (114.2, 24.75, 1) at (85, 48, 1) at (115, 48, 1) at (85, 72, 1) at (115, 72, 1) at (64, 95.25, 1) at (114.2, 95.25, 1) direction (0, 0, -1) diameter 3.5 end through all
sketch "スケッチ7" plane through (0, 0, 1) normal (0, 0, 1) x (1, 0, 0)
  circle A0 centre (85, 72) radius 1.75 projected
  circle A1 centre (85, 72) radius 2.25
  circle A2 centre (115, 72) radius 1.75 projected
  circle A3 centre (115, 72) radius 2.25
  circle A4 centre (115, 48) radius 1.75 projected
  circle A5 centre (115, 48) radius 2.25
  circle A6 centre (85, 48) radius 1.75 projected
  circle A7 centre (85, 48) radius 2.25
  point P0 (0, 0)
  dimension "d63" = 4.5
  dimension "d64" = 4.5
  dimension "d65" = 4.5
  dimension "d66" = 4.5
extrude "押し出し4" cut sketch "スケッチ7" against normal blind 1 contours A0 | A1 | A2 | A3 | A4 | A5 | A6 | A7
sketch "スケッチ9" plane through (0, 0, 1) normal (0, 0, 1) x (1, 0, 0)
  circle A0 centre (85, 72) radius 2.25 construction
  circle A1 centre (85, 48) radius 2.25 construction
  line L0 (85, 72) -> (85, 48) construction
  circle A2 centre (115, 72) radius 2.25 construction
  circle A3 centre (115, 48) radius 2.25 construction
  line L1 (115, 72) -> (115, 48) construction
  point P0 (0, 0)
  point P1 (85, 60)
  point P2 (115, 60)
hole "穴3" at (85, 60, 1) at (115, 60, 1) direction (0, 0, -1) diameter 4.5 depth 1 clearance for "Countersunk Flat Head Screw ISO 2009/7046" size "M4" standard "ISO"
ref_plane "作業平面1" through (0, 60, 0) normal (0, 1, 0) x (1, 0, 0)
sketch "スケッチ10" plane through (0, 0, 1) normal (0, 0, 1) x (1, 0, 0)
  circle A0 centre (64, 95.25) radius 1.75 projected
  circle A1 centre (114.2, 95.25) radius 1.75 projected
  line L0 (64, 95.25) -> (114.2, 95.25)
  circle A2 centre (85, 60) radius 2.25 projected
  circle A3 centre (115, 60) radius 2.25 projected
  line L1 (85, 60) -> (115, 60)
  point P0 (0, 0)
  point P1 (89.1, 95.25)
  point P2 (89.1, 24.75)
hole "穴4" at (89.1, 95.25, 1) at (89.1, 24.75, 1) direction (0, 0, -1) diameter 3.4 depth 1 clearance for "Countersunk Flat Head Screw ISO 2009/7046" size "M3" standard "ISO"
properties part number "RD002_フレーム" material "アルミニウム 6061"
